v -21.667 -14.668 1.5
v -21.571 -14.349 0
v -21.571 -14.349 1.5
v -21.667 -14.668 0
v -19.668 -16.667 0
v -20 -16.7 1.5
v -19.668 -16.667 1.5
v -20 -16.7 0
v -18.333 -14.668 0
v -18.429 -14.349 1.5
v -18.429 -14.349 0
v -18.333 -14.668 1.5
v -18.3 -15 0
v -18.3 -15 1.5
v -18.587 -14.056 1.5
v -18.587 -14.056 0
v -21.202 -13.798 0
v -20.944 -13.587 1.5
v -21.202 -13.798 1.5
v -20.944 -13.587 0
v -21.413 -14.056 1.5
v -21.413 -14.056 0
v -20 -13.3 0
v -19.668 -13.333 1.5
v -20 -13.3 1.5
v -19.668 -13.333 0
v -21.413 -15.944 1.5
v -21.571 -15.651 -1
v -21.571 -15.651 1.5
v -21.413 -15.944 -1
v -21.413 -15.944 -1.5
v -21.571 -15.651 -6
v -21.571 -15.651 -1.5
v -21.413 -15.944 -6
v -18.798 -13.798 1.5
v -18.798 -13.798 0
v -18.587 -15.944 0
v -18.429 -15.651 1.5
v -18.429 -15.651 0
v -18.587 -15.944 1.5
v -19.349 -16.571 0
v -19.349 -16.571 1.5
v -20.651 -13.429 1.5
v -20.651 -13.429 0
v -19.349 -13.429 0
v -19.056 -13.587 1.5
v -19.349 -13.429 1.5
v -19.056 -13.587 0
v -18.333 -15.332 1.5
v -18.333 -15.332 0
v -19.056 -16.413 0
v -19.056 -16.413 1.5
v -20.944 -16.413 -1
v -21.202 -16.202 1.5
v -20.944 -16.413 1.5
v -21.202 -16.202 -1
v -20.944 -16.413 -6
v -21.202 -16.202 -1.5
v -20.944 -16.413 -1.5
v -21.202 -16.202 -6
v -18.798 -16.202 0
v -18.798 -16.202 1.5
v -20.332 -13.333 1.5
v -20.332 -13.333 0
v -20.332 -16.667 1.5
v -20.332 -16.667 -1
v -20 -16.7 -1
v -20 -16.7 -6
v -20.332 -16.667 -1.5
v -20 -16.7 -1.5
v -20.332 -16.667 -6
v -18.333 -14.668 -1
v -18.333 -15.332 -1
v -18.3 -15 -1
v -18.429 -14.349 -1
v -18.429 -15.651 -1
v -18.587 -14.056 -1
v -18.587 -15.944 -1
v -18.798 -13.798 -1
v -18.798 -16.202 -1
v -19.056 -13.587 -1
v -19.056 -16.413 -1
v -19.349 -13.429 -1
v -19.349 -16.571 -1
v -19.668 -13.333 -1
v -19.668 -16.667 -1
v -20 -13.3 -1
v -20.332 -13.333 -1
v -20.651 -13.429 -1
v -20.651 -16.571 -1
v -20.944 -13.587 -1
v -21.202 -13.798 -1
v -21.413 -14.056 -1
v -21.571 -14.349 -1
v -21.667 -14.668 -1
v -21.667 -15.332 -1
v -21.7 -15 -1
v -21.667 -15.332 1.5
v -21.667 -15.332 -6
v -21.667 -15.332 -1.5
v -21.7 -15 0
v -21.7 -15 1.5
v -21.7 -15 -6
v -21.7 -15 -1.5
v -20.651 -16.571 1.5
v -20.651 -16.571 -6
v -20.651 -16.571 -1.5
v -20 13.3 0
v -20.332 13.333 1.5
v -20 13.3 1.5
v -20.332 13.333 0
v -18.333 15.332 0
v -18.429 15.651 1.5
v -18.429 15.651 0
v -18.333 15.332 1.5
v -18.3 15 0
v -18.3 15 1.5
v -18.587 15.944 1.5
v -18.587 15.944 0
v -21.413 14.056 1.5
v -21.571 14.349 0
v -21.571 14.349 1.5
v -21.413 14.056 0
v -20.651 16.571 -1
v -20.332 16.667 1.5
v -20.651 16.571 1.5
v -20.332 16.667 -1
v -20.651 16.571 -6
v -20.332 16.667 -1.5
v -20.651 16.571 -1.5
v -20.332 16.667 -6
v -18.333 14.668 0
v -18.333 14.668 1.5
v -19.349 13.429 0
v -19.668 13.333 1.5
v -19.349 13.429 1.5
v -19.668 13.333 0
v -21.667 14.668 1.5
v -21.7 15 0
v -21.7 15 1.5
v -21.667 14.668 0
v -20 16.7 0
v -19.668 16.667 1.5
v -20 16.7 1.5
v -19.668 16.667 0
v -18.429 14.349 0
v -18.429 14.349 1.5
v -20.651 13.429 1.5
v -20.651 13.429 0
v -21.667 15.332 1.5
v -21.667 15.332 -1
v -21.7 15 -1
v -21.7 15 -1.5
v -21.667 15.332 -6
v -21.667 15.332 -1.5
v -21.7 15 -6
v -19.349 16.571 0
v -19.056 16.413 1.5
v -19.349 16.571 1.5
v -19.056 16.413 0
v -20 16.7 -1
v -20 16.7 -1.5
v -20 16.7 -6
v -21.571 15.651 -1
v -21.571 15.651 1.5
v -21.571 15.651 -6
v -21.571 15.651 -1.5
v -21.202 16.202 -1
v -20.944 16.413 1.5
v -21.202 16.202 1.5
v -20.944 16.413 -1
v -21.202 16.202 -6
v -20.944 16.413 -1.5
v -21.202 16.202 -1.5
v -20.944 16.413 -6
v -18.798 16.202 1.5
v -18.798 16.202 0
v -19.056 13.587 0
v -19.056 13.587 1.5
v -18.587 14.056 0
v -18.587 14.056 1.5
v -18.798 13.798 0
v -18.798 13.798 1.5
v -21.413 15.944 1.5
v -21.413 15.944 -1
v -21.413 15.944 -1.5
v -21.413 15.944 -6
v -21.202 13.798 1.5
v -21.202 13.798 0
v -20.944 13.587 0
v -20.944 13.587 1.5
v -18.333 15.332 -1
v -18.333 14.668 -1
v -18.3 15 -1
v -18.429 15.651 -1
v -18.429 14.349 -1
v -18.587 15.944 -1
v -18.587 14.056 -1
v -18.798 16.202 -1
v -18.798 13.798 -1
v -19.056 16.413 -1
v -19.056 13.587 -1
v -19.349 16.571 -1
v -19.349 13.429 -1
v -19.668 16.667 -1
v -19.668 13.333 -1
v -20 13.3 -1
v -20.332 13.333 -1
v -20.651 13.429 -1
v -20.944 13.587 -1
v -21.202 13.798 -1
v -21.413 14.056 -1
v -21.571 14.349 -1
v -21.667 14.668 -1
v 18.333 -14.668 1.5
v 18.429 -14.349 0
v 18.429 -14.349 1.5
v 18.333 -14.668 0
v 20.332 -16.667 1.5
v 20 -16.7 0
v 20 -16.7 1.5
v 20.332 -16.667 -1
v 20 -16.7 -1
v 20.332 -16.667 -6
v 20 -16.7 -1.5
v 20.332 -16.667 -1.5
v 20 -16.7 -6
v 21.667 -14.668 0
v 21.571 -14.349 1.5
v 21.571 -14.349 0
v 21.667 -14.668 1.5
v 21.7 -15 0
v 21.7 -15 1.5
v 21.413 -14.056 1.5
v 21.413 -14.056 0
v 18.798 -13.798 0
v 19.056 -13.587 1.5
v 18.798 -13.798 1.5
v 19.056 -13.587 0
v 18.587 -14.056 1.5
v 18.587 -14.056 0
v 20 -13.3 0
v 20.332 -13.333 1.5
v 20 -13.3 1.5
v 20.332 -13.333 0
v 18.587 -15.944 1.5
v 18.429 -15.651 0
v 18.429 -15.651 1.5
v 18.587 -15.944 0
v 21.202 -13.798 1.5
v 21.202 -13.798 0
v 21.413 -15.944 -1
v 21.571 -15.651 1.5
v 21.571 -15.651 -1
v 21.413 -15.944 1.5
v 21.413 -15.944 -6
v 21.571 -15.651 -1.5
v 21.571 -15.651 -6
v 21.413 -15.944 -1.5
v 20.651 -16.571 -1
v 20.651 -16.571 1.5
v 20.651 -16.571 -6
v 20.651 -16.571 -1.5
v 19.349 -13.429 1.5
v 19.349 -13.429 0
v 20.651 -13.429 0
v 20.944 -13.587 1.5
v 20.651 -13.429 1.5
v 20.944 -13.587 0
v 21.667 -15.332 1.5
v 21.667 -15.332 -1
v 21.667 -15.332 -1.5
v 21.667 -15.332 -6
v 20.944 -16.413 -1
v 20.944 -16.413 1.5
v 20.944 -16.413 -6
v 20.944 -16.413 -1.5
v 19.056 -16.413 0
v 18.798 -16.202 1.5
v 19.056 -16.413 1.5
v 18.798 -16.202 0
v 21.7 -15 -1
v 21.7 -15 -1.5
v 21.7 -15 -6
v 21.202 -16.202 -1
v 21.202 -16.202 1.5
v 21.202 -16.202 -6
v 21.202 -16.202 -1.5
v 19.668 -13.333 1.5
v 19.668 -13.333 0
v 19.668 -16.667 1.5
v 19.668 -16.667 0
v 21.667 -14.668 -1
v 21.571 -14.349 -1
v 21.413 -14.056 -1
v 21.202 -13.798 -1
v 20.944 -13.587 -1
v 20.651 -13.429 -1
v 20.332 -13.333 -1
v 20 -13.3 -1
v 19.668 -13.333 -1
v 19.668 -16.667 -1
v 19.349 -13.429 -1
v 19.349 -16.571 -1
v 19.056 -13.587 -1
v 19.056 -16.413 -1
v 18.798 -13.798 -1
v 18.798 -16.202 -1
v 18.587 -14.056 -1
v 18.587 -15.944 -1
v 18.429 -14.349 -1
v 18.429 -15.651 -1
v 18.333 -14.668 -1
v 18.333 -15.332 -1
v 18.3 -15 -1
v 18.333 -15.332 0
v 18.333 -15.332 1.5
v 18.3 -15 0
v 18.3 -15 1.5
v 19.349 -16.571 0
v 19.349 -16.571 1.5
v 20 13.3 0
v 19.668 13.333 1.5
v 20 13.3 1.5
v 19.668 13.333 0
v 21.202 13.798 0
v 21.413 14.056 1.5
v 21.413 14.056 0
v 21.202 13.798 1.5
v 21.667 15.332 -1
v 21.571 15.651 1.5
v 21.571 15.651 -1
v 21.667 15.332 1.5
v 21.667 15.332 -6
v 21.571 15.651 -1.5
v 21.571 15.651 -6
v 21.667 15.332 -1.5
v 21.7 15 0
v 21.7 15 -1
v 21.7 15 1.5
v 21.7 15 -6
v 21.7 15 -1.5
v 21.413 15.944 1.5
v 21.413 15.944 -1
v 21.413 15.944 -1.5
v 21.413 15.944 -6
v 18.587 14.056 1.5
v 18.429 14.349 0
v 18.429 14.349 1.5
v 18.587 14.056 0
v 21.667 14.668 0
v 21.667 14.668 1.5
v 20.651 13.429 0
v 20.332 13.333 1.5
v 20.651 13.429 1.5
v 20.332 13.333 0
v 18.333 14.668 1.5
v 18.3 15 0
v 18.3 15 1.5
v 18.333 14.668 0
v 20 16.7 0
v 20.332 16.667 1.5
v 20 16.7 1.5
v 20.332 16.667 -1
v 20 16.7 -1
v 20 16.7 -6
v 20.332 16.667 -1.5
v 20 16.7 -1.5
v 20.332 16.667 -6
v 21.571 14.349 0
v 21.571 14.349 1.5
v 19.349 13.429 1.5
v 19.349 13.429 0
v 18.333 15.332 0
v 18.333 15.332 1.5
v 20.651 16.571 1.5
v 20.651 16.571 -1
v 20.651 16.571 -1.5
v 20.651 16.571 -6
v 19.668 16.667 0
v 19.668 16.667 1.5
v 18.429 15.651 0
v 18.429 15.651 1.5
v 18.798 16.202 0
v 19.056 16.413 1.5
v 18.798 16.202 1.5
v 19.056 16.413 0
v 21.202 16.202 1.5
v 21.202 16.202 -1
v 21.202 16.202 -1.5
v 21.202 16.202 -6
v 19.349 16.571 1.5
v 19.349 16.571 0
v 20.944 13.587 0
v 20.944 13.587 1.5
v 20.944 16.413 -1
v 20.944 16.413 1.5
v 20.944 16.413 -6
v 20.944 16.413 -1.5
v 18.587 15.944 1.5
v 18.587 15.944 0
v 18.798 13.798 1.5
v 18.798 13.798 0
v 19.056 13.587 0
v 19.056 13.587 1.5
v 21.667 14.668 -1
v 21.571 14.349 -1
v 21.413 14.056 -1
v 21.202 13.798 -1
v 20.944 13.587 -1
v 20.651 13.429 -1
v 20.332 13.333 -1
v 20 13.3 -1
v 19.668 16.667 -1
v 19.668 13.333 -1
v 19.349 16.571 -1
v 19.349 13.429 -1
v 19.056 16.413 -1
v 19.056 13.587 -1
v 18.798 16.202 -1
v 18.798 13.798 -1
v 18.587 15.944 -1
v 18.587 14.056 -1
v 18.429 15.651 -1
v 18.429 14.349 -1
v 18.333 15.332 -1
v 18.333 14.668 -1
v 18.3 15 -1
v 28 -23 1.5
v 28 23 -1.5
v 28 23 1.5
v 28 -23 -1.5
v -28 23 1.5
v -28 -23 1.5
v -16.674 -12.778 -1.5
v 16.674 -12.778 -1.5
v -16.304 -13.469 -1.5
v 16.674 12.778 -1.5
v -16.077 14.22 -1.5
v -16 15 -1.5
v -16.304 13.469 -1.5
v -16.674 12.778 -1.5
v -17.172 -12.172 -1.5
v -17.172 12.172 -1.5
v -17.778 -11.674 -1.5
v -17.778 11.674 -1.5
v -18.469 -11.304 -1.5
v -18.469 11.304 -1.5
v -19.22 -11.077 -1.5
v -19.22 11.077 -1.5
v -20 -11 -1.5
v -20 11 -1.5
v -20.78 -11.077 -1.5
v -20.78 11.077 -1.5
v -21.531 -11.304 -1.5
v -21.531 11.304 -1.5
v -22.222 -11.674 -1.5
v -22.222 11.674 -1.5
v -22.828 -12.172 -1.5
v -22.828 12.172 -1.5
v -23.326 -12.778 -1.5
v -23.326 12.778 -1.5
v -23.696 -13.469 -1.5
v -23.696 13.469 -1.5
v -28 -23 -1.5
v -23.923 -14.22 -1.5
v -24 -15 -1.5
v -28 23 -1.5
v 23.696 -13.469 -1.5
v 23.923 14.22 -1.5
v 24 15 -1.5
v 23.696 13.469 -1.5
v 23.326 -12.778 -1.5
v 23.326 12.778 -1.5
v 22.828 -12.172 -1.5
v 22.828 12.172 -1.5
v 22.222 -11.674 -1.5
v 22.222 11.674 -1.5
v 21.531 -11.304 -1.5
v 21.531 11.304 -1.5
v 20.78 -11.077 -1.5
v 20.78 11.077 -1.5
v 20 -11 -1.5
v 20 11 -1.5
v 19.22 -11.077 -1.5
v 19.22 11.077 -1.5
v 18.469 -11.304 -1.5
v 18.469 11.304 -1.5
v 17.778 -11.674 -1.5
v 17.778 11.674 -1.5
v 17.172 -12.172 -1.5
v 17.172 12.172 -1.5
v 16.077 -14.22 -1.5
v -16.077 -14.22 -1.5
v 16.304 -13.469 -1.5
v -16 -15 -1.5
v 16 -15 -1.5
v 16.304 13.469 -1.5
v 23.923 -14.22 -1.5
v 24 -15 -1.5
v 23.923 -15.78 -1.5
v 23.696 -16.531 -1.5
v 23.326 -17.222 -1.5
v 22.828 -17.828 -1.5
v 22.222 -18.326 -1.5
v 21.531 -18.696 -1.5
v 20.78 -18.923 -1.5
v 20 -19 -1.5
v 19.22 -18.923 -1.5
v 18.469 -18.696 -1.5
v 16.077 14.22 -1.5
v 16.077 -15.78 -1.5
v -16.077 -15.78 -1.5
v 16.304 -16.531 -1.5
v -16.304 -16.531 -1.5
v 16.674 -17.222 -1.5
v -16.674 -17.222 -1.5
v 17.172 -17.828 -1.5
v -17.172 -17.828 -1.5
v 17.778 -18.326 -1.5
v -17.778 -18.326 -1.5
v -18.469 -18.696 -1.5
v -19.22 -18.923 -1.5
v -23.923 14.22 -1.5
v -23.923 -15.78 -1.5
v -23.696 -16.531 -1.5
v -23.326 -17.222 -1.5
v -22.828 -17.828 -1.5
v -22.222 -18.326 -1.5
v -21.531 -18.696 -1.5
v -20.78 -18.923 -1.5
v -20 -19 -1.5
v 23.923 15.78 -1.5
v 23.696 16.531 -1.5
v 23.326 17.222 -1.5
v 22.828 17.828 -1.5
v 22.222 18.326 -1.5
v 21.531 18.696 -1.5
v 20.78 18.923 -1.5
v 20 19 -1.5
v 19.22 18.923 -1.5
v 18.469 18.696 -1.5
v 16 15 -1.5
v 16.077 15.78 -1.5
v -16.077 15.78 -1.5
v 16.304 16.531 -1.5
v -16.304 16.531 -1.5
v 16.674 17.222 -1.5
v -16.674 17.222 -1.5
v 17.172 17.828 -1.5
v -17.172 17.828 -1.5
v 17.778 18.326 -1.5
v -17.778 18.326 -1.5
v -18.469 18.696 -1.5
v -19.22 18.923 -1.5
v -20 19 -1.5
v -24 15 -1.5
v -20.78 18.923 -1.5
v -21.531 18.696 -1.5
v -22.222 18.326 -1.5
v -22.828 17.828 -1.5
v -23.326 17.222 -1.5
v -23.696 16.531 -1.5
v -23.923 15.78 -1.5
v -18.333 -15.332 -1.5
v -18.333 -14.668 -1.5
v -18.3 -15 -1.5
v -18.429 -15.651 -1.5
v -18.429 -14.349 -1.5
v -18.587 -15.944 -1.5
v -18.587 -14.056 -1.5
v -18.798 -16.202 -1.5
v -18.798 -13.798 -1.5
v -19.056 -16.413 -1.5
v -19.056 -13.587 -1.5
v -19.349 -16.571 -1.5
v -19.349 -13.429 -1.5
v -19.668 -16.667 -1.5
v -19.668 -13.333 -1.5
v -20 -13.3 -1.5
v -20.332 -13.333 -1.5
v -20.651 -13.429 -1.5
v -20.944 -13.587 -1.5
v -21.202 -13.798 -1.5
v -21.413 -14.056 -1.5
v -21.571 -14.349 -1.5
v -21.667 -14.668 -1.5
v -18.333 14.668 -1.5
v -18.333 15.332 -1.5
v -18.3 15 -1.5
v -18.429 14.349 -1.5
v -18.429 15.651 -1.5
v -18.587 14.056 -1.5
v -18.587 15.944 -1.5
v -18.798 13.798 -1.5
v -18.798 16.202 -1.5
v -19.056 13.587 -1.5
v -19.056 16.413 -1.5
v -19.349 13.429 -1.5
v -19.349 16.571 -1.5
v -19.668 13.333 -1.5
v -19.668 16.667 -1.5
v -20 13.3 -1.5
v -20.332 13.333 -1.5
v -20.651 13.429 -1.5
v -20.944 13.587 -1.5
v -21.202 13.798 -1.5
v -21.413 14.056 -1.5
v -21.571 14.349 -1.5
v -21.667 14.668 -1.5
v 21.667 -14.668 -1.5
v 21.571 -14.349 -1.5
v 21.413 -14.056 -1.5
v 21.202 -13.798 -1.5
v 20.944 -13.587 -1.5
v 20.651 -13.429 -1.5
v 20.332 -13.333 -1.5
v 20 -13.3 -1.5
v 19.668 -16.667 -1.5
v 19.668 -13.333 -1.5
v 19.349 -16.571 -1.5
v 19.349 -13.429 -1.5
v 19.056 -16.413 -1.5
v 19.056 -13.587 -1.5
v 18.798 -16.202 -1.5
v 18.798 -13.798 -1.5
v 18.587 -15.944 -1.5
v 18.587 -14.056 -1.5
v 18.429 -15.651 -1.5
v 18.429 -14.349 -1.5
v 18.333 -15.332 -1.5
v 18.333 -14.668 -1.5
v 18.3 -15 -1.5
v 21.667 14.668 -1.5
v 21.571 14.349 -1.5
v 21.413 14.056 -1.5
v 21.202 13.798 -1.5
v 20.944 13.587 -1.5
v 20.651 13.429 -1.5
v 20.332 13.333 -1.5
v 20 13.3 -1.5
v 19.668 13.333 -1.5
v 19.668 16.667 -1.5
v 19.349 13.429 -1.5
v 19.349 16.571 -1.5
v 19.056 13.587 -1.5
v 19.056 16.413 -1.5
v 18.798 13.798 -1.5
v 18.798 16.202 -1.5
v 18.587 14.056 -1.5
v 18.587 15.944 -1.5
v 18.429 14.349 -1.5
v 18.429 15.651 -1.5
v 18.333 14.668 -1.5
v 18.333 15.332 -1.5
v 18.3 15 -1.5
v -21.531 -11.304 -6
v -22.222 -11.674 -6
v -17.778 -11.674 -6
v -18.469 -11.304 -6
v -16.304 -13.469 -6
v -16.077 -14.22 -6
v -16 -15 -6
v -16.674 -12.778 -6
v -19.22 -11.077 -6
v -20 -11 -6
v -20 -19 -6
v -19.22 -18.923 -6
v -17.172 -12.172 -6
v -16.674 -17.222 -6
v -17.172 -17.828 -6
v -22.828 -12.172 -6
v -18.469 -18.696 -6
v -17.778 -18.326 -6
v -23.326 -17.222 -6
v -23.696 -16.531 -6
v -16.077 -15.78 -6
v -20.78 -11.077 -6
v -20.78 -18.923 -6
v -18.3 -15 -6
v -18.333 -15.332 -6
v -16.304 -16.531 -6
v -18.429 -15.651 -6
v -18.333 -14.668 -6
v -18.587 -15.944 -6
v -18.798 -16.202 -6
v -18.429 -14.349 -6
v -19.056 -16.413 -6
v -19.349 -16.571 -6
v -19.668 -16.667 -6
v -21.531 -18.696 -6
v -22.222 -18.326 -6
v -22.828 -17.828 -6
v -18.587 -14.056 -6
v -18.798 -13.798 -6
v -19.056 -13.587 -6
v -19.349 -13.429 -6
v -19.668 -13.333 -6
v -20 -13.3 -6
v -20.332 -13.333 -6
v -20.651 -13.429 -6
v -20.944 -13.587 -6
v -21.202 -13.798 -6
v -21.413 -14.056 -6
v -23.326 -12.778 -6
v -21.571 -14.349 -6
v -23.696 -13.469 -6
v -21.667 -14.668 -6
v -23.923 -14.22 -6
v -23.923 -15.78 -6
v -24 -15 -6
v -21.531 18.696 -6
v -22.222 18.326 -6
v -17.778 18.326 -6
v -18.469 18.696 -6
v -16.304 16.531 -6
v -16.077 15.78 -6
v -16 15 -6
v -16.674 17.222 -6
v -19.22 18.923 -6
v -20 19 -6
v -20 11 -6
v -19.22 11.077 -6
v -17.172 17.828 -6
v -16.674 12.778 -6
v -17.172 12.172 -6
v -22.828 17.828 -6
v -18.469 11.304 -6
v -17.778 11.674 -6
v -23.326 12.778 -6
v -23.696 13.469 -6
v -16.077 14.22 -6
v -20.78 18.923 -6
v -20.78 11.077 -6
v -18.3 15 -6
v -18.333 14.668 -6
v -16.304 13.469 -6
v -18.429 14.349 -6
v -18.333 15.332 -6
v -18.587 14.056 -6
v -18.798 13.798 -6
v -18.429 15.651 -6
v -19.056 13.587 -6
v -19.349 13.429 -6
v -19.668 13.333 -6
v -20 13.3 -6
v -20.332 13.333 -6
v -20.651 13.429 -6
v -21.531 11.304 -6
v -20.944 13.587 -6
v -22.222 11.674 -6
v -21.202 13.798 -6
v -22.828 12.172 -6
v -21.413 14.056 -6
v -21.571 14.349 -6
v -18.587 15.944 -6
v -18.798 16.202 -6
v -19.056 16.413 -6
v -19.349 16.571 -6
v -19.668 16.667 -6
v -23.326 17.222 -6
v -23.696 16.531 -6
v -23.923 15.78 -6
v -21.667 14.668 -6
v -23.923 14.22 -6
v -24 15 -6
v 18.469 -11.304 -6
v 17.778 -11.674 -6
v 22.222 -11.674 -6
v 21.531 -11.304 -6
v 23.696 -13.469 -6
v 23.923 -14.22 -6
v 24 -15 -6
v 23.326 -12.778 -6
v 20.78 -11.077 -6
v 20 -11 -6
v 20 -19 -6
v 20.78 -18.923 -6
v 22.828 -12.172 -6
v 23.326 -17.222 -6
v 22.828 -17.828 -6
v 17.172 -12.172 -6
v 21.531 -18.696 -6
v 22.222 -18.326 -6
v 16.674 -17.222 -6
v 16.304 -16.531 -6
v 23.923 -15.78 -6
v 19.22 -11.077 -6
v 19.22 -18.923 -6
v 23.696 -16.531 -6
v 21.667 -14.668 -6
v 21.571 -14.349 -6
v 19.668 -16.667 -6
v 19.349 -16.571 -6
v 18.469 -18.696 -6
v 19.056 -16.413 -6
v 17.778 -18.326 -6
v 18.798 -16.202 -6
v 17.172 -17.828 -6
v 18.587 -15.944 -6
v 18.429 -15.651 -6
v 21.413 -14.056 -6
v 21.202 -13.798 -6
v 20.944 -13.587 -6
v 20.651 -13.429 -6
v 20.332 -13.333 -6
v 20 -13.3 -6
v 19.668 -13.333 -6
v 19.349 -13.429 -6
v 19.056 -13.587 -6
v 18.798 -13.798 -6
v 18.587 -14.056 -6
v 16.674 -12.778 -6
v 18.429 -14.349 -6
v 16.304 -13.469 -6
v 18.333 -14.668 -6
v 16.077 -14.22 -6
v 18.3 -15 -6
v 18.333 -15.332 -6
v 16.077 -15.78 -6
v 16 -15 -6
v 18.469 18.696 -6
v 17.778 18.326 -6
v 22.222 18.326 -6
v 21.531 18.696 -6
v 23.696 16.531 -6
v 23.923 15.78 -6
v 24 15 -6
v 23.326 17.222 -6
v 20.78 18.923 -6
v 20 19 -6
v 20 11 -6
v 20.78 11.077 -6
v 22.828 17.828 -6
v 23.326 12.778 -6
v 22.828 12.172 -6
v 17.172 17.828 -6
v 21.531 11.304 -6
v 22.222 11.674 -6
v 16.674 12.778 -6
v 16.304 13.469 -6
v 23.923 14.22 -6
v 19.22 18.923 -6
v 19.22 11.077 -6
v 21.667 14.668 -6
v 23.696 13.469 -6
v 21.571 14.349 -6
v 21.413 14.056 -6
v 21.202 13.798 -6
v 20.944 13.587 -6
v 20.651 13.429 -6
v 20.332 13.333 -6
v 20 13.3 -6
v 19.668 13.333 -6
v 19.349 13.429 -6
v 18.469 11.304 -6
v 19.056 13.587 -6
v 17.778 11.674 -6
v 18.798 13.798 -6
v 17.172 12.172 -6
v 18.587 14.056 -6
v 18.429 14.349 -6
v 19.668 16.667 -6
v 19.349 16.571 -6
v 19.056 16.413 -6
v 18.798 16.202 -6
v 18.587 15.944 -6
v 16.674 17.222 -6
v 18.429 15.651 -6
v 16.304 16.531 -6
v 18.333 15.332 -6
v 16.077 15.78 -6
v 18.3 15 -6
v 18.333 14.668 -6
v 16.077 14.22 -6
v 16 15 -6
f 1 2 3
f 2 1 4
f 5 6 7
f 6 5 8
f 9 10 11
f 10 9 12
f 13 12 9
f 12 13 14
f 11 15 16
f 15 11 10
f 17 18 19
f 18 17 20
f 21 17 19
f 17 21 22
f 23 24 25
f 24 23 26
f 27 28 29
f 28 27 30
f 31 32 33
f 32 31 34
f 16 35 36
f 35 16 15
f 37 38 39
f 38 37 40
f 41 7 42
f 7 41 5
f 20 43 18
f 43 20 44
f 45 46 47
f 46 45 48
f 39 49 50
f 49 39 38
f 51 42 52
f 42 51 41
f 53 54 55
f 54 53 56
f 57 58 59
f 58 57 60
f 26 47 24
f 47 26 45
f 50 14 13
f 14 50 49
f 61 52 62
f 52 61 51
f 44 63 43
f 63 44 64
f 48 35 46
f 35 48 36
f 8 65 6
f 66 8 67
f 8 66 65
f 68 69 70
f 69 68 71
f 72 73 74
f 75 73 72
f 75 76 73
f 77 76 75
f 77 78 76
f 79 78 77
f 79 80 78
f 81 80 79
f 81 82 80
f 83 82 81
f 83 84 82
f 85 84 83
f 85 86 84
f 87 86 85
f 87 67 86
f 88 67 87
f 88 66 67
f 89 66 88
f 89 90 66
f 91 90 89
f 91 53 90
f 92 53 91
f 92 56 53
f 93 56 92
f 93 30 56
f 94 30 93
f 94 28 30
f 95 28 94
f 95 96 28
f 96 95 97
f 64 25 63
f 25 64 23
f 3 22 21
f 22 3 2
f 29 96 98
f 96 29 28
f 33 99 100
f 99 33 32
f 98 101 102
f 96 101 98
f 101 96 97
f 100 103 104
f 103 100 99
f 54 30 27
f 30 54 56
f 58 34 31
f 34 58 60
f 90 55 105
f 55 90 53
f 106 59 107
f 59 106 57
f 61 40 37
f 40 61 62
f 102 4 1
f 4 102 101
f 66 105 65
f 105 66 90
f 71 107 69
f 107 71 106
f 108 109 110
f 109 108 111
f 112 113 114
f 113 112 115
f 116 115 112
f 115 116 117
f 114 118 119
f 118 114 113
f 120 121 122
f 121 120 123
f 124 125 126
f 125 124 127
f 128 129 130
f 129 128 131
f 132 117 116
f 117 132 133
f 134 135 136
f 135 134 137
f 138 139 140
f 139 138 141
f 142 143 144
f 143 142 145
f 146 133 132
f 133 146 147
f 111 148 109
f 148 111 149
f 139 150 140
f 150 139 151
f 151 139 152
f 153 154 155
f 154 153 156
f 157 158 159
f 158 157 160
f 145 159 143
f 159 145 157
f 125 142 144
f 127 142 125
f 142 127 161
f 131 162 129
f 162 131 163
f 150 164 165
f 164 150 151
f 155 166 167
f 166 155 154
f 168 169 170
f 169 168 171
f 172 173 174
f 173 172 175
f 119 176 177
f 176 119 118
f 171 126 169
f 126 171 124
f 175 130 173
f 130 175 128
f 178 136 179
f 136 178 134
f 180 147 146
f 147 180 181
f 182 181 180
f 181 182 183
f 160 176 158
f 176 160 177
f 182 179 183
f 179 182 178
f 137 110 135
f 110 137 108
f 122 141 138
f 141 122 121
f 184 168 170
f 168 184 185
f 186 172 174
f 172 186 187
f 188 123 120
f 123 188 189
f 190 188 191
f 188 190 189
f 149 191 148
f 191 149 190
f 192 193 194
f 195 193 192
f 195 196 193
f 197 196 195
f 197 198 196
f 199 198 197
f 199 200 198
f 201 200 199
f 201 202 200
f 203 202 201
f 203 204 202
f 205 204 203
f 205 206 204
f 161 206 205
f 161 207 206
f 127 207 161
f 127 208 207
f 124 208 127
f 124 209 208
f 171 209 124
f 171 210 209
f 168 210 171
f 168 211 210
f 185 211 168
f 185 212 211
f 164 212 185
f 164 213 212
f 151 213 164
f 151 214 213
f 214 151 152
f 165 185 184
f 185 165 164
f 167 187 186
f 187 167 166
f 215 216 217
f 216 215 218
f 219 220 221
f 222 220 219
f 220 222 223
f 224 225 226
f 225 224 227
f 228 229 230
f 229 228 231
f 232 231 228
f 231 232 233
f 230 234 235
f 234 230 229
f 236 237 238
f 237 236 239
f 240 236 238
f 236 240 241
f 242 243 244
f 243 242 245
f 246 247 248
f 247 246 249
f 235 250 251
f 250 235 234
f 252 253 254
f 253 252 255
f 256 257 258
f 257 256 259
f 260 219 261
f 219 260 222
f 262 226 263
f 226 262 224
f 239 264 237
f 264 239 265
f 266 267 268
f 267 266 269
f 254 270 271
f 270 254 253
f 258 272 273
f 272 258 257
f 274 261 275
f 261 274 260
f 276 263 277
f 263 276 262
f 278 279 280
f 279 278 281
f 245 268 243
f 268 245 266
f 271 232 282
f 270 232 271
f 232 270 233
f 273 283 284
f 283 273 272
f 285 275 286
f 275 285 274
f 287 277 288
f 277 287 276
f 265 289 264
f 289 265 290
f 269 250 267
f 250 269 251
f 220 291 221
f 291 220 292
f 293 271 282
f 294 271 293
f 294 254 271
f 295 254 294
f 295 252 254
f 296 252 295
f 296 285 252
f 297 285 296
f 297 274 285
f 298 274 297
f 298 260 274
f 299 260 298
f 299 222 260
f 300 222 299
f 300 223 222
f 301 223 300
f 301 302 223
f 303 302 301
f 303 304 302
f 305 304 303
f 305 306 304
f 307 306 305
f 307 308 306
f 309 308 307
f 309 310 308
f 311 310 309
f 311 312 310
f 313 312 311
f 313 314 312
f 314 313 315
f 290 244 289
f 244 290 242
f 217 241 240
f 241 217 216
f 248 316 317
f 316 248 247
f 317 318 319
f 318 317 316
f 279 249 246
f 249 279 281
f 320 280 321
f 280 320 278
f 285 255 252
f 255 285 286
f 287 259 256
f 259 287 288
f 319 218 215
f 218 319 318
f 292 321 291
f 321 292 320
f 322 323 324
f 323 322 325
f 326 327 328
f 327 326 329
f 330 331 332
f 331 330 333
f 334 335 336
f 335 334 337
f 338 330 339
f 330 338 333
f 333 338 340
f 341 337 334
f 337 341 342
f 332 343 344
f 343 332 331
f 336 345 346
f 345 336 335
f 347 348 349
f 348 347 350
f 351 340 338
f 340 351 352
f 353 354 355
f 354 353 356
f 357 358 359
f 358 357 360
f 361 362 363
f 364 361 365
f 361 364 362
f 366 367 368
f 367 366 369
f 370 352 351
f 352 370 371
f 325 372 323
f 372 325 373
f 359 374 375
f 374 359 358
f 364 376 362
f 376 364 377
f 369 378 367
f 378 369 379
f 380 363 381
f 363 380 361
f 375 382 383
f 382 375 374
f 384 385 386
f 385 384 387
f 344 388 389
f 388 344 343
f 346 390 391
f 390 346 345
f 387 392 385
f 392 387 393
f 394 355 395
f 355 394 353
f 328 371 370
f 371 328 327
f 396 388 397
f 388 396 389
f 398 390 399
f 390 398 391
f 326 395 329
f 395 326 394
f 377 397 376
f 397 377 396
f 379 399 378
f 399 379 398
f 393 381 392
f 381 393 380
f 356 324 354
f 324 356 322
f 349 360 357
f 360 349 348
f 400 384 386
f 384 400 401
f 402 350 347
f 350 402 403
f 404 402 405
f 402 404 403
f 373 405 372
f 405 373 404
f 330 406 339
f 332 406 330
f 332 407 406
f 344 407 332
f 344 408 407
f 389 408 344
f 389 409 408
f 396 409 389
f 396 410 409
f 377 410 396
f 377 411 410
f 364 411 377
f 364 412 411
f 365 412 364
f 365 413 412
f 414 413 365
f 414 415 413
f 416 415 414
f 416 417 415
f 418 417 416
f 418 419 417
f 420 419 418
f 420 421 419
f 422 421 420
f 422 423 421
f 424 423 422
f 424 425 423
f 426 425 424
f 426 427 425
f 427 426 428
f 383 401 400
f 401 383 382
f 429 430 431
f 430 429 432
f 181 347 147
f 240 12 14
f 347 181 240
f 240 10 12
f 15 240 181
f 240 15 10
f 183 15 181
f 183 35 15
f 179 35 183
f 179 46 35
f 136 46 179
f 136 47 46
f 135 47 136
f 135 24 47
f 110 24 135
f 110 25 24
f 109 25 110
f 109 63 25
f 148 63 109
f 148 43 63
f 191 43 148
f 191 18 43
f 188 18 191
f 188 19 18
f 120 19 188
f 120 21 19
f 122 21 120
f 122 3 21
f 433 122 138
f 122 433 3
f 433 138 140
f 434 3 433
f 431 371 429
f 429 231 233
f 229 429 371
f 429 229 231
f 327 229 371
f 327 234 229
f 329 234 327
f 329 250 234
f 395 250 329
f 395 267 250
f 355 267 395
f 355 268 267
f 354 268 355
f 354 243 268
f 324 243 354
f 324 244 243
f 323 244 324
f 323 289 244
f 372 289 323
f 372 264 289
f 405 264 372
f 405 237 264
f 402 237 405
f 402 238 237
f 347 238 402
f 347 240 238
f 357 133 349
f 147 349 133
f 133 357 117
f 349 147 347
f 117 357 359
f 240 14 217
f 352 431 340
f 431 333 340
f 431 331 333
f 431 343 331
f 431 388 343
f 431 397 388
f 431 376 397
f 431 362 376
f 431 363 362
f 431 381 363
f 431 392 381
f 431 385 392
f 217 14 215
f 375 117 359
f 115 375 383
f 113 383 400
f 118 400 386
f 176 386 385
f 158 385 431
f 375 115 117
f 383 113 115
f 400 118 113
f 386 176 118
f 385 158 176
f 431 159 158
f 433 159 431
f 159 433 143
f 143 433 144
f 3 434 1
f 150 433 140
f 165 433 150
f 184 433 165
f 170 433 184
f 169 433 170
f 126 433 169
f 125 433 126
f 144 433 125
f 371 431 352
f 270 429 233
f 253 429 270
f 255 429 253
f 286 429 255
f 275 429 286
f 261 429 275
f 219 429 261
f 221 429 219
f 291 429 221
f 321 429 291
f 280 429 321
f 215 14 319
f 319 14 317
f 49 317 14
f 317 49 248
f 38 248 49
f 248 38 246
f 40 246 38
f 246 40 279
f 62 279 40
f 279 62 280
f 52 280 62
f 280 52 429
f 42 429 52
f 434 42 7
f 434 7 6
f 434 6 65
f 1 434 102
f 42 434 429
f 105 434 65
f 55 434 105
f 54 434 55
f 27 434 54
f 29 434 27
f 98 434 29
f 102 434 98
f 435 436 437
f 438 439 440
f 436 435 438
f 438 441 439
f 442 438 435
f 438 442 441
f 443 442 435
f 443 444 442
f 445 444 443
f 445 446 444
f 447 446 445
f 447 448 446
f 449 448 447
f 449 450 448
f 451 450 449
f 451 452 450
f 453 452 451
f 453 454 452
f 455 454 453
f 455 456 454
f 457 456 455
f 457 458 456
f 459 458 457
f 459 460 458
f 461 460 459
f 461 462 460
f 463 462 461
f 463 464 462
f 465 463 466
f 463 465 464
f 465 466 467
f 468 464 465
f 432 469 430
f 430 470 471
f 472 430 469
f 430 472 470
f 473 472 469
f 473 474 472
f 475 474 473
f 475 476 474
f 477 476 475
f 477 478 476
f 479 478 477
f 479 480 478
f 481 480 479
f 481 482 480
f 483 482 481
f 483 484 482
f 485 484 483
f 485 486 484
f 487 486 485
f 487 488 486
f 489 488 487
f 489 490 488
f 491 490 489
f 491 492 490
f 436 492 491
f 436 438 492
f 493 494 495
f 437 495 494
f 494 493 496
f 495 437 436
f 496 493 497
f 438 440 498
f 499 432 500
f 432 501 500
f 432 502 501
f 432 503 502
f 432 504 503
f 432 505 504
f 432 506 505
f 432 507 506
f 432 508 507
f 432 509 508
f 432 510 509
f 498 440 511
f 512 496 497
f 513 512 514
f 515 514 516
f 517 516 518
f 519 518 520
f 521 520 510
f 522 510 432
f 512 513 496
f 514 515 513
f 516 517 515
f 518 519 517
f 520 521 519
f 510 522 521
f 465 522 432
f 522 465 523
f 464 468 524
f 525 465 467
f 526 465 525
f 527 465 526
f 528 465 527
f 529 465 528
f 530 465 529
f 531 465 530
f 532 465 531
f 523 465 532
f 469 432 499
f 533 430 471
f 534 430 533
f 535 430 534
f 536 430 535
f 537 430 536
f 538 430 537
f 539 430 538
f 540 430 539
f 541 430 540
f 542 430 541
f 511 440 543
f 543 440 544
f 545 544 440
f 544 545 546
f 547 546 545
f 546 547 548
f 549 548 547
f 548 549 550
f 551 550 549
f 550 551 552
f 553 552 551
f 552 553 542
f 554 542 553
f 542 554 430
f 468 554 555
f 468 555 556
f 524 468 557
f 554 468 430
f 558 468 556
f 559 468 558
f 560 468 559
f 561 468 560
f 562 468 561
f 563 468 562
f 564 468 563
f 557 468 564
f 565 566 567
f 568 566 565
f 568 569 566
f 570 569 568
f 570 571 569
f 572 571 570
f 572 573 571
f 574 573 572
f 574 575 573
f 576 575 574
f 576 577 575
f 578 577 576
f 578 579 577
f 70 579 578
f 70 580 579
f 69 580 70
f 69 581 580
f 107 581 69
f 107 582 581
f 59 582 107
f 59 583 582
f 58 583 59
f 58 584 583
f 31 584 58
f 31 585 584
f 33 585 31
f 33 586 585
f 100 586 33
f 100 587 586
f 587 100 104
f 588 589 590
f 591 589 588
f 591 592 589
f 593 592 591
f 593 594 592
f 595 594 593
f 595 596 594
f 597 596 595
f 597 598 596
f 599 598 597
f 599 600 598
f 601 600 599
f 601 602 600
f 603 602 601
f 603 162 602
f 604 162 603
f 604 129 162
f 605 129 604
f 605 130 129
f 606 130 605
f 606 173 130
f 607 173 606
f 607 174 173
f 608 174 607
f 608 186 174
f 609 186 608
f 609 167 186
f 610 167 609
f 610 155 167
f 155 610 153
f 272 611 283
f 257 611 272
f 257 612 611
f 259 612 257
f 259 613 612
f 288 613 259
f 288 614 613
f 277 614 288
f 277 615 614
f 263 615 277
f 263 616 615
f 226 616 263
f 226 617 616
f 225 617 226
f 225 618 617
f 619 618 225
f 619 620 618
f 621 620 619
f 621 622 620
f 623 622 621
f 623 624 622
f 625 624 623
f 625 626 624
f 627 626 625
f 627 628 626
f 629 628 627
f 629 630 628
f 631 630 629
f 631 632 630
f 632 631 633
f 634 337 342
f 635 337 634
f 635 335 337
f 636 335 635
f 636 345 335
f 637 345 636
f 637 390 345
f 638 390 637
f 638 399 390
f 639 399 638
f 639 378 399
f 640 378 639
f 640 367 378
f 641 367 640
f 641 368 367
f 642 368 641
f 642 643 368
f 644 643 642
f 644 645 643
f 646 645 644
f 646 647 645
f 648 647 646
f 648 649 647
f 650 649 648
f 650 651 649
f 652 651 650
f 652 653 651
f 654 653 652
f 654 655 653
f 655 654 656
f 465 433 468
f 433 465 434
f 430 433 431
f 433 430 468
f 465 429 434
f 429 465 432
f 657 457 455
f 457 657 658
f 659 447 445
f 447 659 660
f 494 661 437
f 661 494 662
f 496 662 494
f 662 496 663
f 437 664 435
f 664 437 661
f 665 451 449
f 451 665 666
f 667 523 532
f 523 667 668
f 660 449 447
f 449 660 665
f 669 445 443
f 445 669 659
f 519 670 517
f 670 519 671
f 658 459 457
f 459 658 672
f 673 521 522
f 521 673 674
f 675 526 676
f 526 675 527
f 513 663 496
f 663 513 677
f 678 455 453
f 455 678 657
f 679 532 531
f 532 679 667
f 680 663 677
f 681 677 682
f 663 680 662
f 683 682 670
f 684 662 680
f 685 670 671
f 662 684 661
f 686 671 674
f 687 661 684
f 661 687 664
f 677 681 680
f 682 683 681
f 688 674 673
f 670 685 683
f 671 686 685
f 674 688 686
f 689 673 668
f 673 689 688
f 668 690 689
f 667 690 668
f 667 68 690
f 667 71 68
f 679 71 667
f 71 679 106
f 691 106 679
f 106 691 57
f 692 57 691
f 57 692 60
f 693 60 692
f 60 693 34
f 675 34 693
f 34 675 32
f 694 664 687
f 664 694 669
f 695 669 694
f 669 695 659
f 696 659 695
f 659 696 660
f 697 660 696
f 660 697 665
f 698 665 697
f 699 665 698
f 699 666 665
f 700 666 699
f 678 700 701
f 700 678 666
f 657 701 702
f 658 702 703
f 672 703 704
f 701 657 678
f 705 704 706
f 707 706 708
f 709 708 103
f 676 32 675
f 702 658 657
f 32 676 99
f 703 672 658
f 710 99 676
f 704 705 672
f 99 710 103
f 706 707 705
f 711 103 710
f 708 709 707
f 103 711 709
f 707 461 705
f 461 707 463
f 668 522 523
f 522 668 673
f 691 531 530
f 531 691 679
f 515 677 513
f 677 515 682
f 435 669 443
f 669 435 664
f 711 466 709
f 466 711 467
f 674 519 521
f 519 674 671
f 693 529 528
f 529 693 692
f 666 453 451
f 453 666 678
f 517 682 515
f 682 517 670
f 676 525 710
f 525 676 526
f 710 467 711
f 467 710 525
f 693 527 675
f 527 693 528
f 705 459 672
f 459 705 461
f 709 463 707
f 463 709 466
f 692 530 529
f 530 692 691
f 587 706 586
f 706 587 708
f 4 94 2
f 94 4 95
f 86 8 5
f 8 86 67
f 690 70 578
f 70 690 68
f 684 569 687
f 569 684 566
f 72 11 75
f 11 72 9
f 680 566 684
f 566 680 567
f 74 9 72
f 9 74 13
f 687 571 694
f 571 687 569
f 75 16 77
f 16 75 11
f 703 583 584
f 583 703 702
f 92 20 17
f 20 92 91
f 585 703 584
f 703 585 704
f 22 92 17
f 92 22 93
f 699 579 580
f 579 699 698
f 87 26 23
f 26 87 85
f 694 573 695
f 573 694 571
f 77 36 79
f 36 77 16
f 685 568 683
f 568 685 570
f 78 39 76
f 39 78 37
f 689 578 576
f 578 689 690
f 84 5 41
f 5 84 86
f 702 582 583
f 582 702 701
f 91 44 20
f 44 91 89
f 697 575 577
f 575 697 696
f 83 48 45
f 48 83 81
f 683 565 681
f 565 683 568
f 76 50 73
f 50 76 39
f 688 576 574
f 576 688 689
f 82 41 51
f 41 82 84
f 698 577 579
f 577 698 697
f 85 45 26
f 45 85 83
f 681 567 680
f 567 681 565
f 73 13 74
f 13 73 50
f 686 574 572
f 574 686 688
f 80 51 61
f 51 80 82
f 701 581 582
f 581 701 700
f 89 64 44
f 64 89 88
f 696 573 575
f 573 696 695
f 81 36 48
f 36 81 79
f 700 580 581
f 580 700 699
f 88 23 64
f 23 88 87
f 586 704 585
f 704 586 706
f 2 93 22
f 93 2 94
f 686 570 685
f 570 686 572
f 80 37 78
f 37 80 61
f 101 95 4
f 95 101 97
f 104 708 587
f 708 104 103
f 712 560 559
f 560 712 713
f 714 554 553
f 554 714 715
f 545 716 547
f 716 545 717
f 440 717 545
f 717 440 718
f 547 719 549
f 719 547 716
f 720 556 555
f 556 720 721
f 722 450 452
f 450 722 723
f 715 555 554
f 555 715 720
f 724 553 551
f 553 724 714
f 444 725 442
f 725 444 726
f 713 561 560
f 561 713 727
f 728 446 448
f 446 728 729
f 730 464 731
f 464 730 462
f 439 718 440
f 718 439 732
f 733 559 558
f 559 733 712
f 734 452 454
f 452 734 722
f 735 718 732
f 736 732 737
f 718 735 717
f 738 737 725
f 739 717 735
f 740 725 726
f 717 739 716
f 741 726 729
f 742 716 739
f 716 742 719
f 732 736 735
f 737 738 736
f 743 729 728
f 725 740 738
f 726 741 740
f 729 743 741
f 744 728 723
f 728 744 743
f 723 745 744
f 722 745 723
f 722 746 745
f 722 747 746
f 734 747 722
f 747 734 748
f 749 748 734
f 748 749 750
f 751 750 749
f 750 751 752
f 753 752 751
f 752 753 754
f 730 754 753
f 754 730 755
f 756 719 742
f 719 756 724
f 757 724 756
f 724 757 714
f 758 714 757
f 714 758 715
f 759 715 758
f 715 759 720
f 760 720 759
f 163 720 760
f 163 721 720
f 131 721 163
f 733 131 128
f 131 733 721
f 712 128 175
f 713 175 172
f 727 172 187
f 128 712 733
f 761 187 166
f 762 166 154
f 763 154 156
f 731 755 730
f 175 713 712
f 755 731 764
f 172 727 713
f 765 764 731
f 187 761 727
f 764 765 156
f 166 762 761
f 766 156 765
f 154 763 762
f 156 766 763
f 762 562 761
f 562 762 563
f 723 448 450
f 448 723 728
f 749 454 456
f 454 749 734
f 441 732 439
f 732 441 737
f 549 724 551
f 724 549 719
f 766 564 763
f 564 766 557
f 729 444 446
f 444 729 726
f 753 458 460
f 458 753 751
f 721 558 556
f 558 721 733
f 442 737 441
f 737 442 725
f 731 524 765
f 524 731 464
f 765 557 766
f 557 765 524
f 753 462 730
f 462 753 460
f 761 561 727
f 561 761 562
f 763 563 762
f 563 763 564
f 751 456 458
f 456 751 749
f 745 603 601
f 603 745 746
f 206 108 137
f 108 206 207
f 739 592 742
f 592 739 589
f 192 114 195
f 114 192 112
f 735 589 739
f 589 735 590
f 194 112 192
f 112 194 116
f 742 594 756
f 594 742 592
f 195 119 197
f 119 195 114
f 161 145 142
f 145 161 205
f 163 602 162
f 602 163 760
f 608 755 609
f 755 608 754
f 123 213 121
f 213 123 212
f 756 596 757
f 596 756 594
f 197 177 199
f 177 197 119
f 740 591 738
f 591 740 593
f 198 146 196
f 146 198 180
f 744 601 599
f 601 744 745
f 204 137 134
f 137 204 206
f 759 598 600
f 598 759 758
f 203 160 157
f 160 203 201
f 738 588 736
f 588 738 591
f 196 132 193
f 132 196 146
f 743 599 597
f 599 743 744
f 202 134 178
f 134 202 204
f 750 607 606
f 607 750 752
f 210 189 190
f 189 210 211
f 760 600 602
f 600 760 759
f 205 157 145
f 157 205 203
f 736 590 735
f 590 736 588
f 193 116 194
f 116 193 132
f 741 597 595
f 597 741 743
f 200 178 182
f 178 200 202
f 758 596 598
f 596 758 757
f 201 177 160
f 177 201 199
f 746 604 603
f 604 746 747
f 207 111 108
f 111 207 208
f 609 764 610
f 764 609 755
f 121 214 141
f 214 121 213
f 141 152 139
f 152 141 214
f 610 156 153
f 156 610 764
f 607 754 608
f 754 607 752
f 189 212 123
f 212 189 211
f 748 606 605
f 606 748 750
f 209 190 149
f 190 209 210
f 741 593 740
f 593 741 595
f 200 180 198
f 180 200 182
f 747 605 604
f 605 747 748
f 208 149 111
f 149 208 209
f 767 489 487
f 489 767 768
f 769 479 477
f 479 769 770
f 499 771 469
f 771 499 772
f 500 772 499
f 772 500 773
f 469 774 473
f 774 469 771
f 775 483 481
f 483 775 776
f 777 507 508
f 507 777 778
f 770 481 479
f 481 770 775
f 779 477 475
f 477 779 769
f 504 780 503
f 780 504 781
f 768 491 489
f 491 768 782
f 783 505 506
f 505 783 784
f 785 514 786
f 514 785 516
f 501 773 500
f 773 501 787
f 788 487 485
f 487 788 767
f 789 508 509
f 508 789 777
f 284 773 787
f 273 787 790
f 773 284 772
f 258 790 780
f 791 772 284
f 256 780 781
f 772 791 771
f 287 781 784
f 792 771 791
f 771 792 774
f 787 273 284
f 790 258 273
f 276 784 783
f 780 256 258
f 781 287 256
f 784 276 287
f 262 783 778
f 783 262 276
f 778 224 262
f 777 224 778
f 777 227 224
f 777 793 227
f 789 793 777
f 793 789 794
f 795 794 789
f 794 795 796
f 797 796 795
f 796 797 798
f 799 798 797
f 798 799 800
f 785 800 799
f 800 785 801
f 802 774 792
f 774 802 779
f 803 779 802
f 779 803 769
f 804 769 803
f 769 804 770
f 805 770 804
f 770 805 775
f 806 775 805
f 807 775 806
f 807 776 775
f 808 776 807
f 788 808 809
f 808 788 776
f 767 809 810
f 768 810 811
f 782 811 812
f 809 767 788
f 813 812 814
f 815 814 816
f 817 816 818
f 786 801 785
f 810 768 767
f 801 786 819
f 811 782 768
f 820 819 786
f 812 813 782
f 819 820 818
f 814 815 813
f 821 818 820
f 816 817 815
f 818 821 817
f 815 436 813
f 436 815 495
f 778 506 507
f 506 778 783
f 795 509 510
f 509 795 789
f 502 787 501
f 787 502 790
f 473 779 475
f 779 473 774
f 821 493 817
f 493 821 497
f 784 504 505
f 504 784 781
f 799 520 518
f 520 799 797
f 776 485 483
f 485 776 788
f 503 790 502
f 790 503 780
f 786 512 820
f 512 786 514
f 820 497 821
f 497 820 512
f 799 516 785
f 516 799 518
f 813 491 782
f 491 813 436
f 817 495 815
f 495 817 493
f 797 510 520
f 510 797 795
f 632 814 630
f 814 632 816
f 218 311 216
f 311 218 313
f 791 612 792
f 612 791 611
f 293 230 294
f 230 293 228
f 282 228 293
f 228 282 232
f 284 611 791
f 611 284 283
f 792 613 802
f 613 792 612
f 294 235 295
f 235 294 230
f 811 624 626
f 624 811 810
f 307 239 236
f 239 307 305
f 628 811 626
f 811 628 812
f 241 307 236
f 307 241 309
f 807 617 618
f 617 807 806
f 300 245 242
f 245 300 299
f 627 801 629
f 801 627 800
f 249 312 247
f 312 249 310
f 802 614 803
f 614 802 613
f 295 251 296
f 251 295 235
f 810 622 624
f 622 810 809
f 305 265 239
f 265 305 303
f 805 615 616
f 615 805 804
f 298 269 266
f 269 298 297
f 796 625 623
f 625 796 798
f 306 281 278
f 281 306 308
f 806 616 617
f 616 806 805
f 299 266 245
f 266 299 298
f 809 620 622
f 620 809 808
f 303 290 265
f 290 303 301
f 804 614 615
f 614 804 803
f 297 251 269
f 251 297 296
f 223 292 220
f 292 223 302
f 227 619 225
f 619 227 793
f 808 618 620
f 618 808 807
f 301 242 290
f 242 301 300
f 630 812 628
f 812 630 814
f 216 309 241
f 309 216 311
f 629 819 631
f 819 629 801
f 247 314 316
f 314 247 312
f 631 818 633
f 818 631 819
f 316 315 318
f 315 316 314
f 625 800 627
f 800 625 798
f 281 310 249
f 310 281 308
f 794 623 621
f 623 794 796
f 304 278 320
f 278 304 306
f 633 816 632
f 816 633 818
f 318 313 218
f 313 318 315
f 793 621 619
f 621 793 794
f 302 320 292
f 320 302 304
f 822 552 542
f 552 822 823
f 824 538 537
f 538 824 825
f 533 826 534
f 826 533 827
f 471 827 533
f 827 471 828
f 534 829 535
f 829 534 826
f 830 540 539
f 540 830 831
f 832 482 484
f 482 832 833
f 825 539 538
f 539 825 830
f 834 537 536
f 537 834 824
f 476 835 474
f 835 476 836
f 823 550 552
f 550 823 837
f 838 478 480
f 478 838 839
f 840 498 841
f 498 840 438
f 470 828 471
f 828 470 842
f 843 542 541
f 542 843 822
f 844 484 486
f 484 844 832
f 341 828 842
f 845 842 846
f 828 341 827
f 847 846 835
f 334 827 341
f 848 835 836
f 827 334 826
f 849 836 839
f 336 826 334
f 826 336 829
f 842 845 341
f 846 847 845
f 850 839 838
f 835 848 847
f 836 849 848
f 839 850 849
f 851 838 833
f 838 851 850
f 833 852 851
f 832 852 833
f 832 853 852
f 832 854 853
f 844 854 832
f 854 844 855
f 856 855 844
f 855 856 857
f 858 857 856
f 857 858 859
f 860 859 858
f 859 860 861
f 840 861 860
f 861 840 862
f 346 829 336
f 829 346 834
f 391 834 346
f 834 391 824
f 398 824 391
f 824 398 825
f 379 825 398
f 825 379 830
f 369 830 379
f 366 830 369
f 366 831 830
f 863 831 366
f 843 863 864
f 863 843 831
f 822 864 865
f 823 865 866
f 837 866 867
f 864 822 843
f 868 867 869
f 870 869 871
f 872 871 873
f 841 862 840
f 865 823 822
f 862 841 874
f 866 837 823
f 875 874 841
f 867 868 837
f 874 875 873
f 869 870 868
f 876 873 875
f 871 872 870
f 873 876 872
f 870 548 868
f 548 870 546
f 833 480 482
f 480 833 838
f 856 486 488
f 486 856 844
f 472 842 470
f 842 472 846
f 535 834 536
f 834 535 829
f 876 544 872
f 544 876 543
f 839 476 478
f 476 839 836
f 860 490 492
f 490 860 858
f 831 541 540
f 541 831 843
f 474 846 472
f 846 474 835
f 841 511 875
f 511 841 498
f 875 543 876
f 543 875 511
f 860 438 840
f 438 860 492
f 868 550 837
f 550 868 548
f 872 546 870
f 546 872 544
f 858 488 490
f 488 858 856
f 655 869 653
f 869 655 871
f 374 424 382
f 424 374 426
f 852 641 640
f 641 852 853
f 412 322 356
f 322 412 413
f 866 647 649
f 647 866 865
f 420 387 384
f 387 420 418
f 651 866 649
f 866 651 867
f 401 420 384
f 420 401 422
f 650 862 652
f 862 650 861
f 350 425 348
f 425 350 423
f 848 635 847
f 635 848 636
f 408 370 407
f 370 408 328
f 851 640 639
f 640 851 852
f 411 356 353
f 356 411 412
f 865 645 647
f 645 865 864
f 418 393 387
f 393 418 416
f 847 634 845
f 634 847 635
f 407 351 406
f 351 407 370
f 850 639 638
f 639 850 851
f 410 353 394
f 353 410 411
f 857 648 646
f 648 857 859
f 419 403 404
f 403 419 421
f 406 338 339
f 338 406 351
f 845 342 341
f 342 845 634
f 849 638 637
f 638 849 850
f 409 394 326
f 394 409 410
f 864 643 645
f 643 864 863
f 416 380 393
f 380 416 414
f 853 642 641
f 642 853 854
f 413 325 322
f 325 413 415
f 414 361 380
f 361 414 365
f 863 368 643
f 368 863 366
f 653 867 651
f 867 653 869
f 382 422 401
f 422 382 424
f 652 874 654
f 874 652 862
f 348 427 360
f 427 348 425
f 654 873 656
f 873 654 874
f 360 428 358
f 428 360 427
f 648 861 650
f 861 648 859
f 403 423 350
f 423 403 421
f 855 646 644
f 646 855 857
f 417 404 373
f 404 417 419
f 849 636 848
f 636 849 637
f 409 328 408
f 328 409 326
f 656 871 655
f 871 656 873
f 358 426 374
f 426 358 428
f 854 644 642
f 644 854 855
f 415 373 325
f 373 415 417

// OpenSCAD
// suport_electronica.scad
// Safata/suport central que aixeca la micro:bit + Micro:shield sobre el
// xassis del vehicle (T2, reaprofitat sense canvis al rover T3), deixant
// pas de cables per sota. Els 4 forats coincideixen amb els 4 forats M3
// centrals ("MICRO:BIT + MICRO:SHIELD") del xassis de 190x140 mm de
// Recursos/plantilles_laser/xassis_vehicle.svg (separacio 40 x 30 mm).
// Material recomanat: PLA. 1 unitat per vehicle.

// --- Parametres (mm) ---
amplada_safata = 56;        // cobreix la micro:bit + Micro:shield (43 x 52 mm) amb marge
fondaria_safata = 46;
gruix_safata = 3;
alcada_potes = 6;           // aixeca la placa per deixar pas de cables per sota
diametre_pota = 8;
separacio_forats_x = 40;    // ha de coincidir amb el xassis
separacio_forats_y = 30;    // ha de coincidir amb el xassis
forat_m3 = 3.4;
$fn = 32;

module safata() {
    difference() {
        cube([amplada_safata, fondaria_safata, gruix_safata], center = true);
        for (x = [-separacio_forats_x / 2, separacio_forats_x / 2])
            for (y = [-separacio_forats_y / 2, separacio_forats_y / 2])
                translate([x, y, -1])
                    cylinder(h = gruix_safata + 2, d = forat_m3);
    }
}

module pota(x, y) {
    translate([x, y, -alcada_potes])
        difference() {
            cylinder(h = alcada_potes, d = diametre_pota);
            translate([0, 0, -1])
                cylinder(h = alcada_potes + 2, d = forat_m3);
        }
}

union() {
    safata();
    for (x = [-separacio_forats_x / 2, separacio_forats_x / 2])
        for (y = [-separacio_forats_y / 2, separacio_forats_y / 2])
            pota(x, y);
}
